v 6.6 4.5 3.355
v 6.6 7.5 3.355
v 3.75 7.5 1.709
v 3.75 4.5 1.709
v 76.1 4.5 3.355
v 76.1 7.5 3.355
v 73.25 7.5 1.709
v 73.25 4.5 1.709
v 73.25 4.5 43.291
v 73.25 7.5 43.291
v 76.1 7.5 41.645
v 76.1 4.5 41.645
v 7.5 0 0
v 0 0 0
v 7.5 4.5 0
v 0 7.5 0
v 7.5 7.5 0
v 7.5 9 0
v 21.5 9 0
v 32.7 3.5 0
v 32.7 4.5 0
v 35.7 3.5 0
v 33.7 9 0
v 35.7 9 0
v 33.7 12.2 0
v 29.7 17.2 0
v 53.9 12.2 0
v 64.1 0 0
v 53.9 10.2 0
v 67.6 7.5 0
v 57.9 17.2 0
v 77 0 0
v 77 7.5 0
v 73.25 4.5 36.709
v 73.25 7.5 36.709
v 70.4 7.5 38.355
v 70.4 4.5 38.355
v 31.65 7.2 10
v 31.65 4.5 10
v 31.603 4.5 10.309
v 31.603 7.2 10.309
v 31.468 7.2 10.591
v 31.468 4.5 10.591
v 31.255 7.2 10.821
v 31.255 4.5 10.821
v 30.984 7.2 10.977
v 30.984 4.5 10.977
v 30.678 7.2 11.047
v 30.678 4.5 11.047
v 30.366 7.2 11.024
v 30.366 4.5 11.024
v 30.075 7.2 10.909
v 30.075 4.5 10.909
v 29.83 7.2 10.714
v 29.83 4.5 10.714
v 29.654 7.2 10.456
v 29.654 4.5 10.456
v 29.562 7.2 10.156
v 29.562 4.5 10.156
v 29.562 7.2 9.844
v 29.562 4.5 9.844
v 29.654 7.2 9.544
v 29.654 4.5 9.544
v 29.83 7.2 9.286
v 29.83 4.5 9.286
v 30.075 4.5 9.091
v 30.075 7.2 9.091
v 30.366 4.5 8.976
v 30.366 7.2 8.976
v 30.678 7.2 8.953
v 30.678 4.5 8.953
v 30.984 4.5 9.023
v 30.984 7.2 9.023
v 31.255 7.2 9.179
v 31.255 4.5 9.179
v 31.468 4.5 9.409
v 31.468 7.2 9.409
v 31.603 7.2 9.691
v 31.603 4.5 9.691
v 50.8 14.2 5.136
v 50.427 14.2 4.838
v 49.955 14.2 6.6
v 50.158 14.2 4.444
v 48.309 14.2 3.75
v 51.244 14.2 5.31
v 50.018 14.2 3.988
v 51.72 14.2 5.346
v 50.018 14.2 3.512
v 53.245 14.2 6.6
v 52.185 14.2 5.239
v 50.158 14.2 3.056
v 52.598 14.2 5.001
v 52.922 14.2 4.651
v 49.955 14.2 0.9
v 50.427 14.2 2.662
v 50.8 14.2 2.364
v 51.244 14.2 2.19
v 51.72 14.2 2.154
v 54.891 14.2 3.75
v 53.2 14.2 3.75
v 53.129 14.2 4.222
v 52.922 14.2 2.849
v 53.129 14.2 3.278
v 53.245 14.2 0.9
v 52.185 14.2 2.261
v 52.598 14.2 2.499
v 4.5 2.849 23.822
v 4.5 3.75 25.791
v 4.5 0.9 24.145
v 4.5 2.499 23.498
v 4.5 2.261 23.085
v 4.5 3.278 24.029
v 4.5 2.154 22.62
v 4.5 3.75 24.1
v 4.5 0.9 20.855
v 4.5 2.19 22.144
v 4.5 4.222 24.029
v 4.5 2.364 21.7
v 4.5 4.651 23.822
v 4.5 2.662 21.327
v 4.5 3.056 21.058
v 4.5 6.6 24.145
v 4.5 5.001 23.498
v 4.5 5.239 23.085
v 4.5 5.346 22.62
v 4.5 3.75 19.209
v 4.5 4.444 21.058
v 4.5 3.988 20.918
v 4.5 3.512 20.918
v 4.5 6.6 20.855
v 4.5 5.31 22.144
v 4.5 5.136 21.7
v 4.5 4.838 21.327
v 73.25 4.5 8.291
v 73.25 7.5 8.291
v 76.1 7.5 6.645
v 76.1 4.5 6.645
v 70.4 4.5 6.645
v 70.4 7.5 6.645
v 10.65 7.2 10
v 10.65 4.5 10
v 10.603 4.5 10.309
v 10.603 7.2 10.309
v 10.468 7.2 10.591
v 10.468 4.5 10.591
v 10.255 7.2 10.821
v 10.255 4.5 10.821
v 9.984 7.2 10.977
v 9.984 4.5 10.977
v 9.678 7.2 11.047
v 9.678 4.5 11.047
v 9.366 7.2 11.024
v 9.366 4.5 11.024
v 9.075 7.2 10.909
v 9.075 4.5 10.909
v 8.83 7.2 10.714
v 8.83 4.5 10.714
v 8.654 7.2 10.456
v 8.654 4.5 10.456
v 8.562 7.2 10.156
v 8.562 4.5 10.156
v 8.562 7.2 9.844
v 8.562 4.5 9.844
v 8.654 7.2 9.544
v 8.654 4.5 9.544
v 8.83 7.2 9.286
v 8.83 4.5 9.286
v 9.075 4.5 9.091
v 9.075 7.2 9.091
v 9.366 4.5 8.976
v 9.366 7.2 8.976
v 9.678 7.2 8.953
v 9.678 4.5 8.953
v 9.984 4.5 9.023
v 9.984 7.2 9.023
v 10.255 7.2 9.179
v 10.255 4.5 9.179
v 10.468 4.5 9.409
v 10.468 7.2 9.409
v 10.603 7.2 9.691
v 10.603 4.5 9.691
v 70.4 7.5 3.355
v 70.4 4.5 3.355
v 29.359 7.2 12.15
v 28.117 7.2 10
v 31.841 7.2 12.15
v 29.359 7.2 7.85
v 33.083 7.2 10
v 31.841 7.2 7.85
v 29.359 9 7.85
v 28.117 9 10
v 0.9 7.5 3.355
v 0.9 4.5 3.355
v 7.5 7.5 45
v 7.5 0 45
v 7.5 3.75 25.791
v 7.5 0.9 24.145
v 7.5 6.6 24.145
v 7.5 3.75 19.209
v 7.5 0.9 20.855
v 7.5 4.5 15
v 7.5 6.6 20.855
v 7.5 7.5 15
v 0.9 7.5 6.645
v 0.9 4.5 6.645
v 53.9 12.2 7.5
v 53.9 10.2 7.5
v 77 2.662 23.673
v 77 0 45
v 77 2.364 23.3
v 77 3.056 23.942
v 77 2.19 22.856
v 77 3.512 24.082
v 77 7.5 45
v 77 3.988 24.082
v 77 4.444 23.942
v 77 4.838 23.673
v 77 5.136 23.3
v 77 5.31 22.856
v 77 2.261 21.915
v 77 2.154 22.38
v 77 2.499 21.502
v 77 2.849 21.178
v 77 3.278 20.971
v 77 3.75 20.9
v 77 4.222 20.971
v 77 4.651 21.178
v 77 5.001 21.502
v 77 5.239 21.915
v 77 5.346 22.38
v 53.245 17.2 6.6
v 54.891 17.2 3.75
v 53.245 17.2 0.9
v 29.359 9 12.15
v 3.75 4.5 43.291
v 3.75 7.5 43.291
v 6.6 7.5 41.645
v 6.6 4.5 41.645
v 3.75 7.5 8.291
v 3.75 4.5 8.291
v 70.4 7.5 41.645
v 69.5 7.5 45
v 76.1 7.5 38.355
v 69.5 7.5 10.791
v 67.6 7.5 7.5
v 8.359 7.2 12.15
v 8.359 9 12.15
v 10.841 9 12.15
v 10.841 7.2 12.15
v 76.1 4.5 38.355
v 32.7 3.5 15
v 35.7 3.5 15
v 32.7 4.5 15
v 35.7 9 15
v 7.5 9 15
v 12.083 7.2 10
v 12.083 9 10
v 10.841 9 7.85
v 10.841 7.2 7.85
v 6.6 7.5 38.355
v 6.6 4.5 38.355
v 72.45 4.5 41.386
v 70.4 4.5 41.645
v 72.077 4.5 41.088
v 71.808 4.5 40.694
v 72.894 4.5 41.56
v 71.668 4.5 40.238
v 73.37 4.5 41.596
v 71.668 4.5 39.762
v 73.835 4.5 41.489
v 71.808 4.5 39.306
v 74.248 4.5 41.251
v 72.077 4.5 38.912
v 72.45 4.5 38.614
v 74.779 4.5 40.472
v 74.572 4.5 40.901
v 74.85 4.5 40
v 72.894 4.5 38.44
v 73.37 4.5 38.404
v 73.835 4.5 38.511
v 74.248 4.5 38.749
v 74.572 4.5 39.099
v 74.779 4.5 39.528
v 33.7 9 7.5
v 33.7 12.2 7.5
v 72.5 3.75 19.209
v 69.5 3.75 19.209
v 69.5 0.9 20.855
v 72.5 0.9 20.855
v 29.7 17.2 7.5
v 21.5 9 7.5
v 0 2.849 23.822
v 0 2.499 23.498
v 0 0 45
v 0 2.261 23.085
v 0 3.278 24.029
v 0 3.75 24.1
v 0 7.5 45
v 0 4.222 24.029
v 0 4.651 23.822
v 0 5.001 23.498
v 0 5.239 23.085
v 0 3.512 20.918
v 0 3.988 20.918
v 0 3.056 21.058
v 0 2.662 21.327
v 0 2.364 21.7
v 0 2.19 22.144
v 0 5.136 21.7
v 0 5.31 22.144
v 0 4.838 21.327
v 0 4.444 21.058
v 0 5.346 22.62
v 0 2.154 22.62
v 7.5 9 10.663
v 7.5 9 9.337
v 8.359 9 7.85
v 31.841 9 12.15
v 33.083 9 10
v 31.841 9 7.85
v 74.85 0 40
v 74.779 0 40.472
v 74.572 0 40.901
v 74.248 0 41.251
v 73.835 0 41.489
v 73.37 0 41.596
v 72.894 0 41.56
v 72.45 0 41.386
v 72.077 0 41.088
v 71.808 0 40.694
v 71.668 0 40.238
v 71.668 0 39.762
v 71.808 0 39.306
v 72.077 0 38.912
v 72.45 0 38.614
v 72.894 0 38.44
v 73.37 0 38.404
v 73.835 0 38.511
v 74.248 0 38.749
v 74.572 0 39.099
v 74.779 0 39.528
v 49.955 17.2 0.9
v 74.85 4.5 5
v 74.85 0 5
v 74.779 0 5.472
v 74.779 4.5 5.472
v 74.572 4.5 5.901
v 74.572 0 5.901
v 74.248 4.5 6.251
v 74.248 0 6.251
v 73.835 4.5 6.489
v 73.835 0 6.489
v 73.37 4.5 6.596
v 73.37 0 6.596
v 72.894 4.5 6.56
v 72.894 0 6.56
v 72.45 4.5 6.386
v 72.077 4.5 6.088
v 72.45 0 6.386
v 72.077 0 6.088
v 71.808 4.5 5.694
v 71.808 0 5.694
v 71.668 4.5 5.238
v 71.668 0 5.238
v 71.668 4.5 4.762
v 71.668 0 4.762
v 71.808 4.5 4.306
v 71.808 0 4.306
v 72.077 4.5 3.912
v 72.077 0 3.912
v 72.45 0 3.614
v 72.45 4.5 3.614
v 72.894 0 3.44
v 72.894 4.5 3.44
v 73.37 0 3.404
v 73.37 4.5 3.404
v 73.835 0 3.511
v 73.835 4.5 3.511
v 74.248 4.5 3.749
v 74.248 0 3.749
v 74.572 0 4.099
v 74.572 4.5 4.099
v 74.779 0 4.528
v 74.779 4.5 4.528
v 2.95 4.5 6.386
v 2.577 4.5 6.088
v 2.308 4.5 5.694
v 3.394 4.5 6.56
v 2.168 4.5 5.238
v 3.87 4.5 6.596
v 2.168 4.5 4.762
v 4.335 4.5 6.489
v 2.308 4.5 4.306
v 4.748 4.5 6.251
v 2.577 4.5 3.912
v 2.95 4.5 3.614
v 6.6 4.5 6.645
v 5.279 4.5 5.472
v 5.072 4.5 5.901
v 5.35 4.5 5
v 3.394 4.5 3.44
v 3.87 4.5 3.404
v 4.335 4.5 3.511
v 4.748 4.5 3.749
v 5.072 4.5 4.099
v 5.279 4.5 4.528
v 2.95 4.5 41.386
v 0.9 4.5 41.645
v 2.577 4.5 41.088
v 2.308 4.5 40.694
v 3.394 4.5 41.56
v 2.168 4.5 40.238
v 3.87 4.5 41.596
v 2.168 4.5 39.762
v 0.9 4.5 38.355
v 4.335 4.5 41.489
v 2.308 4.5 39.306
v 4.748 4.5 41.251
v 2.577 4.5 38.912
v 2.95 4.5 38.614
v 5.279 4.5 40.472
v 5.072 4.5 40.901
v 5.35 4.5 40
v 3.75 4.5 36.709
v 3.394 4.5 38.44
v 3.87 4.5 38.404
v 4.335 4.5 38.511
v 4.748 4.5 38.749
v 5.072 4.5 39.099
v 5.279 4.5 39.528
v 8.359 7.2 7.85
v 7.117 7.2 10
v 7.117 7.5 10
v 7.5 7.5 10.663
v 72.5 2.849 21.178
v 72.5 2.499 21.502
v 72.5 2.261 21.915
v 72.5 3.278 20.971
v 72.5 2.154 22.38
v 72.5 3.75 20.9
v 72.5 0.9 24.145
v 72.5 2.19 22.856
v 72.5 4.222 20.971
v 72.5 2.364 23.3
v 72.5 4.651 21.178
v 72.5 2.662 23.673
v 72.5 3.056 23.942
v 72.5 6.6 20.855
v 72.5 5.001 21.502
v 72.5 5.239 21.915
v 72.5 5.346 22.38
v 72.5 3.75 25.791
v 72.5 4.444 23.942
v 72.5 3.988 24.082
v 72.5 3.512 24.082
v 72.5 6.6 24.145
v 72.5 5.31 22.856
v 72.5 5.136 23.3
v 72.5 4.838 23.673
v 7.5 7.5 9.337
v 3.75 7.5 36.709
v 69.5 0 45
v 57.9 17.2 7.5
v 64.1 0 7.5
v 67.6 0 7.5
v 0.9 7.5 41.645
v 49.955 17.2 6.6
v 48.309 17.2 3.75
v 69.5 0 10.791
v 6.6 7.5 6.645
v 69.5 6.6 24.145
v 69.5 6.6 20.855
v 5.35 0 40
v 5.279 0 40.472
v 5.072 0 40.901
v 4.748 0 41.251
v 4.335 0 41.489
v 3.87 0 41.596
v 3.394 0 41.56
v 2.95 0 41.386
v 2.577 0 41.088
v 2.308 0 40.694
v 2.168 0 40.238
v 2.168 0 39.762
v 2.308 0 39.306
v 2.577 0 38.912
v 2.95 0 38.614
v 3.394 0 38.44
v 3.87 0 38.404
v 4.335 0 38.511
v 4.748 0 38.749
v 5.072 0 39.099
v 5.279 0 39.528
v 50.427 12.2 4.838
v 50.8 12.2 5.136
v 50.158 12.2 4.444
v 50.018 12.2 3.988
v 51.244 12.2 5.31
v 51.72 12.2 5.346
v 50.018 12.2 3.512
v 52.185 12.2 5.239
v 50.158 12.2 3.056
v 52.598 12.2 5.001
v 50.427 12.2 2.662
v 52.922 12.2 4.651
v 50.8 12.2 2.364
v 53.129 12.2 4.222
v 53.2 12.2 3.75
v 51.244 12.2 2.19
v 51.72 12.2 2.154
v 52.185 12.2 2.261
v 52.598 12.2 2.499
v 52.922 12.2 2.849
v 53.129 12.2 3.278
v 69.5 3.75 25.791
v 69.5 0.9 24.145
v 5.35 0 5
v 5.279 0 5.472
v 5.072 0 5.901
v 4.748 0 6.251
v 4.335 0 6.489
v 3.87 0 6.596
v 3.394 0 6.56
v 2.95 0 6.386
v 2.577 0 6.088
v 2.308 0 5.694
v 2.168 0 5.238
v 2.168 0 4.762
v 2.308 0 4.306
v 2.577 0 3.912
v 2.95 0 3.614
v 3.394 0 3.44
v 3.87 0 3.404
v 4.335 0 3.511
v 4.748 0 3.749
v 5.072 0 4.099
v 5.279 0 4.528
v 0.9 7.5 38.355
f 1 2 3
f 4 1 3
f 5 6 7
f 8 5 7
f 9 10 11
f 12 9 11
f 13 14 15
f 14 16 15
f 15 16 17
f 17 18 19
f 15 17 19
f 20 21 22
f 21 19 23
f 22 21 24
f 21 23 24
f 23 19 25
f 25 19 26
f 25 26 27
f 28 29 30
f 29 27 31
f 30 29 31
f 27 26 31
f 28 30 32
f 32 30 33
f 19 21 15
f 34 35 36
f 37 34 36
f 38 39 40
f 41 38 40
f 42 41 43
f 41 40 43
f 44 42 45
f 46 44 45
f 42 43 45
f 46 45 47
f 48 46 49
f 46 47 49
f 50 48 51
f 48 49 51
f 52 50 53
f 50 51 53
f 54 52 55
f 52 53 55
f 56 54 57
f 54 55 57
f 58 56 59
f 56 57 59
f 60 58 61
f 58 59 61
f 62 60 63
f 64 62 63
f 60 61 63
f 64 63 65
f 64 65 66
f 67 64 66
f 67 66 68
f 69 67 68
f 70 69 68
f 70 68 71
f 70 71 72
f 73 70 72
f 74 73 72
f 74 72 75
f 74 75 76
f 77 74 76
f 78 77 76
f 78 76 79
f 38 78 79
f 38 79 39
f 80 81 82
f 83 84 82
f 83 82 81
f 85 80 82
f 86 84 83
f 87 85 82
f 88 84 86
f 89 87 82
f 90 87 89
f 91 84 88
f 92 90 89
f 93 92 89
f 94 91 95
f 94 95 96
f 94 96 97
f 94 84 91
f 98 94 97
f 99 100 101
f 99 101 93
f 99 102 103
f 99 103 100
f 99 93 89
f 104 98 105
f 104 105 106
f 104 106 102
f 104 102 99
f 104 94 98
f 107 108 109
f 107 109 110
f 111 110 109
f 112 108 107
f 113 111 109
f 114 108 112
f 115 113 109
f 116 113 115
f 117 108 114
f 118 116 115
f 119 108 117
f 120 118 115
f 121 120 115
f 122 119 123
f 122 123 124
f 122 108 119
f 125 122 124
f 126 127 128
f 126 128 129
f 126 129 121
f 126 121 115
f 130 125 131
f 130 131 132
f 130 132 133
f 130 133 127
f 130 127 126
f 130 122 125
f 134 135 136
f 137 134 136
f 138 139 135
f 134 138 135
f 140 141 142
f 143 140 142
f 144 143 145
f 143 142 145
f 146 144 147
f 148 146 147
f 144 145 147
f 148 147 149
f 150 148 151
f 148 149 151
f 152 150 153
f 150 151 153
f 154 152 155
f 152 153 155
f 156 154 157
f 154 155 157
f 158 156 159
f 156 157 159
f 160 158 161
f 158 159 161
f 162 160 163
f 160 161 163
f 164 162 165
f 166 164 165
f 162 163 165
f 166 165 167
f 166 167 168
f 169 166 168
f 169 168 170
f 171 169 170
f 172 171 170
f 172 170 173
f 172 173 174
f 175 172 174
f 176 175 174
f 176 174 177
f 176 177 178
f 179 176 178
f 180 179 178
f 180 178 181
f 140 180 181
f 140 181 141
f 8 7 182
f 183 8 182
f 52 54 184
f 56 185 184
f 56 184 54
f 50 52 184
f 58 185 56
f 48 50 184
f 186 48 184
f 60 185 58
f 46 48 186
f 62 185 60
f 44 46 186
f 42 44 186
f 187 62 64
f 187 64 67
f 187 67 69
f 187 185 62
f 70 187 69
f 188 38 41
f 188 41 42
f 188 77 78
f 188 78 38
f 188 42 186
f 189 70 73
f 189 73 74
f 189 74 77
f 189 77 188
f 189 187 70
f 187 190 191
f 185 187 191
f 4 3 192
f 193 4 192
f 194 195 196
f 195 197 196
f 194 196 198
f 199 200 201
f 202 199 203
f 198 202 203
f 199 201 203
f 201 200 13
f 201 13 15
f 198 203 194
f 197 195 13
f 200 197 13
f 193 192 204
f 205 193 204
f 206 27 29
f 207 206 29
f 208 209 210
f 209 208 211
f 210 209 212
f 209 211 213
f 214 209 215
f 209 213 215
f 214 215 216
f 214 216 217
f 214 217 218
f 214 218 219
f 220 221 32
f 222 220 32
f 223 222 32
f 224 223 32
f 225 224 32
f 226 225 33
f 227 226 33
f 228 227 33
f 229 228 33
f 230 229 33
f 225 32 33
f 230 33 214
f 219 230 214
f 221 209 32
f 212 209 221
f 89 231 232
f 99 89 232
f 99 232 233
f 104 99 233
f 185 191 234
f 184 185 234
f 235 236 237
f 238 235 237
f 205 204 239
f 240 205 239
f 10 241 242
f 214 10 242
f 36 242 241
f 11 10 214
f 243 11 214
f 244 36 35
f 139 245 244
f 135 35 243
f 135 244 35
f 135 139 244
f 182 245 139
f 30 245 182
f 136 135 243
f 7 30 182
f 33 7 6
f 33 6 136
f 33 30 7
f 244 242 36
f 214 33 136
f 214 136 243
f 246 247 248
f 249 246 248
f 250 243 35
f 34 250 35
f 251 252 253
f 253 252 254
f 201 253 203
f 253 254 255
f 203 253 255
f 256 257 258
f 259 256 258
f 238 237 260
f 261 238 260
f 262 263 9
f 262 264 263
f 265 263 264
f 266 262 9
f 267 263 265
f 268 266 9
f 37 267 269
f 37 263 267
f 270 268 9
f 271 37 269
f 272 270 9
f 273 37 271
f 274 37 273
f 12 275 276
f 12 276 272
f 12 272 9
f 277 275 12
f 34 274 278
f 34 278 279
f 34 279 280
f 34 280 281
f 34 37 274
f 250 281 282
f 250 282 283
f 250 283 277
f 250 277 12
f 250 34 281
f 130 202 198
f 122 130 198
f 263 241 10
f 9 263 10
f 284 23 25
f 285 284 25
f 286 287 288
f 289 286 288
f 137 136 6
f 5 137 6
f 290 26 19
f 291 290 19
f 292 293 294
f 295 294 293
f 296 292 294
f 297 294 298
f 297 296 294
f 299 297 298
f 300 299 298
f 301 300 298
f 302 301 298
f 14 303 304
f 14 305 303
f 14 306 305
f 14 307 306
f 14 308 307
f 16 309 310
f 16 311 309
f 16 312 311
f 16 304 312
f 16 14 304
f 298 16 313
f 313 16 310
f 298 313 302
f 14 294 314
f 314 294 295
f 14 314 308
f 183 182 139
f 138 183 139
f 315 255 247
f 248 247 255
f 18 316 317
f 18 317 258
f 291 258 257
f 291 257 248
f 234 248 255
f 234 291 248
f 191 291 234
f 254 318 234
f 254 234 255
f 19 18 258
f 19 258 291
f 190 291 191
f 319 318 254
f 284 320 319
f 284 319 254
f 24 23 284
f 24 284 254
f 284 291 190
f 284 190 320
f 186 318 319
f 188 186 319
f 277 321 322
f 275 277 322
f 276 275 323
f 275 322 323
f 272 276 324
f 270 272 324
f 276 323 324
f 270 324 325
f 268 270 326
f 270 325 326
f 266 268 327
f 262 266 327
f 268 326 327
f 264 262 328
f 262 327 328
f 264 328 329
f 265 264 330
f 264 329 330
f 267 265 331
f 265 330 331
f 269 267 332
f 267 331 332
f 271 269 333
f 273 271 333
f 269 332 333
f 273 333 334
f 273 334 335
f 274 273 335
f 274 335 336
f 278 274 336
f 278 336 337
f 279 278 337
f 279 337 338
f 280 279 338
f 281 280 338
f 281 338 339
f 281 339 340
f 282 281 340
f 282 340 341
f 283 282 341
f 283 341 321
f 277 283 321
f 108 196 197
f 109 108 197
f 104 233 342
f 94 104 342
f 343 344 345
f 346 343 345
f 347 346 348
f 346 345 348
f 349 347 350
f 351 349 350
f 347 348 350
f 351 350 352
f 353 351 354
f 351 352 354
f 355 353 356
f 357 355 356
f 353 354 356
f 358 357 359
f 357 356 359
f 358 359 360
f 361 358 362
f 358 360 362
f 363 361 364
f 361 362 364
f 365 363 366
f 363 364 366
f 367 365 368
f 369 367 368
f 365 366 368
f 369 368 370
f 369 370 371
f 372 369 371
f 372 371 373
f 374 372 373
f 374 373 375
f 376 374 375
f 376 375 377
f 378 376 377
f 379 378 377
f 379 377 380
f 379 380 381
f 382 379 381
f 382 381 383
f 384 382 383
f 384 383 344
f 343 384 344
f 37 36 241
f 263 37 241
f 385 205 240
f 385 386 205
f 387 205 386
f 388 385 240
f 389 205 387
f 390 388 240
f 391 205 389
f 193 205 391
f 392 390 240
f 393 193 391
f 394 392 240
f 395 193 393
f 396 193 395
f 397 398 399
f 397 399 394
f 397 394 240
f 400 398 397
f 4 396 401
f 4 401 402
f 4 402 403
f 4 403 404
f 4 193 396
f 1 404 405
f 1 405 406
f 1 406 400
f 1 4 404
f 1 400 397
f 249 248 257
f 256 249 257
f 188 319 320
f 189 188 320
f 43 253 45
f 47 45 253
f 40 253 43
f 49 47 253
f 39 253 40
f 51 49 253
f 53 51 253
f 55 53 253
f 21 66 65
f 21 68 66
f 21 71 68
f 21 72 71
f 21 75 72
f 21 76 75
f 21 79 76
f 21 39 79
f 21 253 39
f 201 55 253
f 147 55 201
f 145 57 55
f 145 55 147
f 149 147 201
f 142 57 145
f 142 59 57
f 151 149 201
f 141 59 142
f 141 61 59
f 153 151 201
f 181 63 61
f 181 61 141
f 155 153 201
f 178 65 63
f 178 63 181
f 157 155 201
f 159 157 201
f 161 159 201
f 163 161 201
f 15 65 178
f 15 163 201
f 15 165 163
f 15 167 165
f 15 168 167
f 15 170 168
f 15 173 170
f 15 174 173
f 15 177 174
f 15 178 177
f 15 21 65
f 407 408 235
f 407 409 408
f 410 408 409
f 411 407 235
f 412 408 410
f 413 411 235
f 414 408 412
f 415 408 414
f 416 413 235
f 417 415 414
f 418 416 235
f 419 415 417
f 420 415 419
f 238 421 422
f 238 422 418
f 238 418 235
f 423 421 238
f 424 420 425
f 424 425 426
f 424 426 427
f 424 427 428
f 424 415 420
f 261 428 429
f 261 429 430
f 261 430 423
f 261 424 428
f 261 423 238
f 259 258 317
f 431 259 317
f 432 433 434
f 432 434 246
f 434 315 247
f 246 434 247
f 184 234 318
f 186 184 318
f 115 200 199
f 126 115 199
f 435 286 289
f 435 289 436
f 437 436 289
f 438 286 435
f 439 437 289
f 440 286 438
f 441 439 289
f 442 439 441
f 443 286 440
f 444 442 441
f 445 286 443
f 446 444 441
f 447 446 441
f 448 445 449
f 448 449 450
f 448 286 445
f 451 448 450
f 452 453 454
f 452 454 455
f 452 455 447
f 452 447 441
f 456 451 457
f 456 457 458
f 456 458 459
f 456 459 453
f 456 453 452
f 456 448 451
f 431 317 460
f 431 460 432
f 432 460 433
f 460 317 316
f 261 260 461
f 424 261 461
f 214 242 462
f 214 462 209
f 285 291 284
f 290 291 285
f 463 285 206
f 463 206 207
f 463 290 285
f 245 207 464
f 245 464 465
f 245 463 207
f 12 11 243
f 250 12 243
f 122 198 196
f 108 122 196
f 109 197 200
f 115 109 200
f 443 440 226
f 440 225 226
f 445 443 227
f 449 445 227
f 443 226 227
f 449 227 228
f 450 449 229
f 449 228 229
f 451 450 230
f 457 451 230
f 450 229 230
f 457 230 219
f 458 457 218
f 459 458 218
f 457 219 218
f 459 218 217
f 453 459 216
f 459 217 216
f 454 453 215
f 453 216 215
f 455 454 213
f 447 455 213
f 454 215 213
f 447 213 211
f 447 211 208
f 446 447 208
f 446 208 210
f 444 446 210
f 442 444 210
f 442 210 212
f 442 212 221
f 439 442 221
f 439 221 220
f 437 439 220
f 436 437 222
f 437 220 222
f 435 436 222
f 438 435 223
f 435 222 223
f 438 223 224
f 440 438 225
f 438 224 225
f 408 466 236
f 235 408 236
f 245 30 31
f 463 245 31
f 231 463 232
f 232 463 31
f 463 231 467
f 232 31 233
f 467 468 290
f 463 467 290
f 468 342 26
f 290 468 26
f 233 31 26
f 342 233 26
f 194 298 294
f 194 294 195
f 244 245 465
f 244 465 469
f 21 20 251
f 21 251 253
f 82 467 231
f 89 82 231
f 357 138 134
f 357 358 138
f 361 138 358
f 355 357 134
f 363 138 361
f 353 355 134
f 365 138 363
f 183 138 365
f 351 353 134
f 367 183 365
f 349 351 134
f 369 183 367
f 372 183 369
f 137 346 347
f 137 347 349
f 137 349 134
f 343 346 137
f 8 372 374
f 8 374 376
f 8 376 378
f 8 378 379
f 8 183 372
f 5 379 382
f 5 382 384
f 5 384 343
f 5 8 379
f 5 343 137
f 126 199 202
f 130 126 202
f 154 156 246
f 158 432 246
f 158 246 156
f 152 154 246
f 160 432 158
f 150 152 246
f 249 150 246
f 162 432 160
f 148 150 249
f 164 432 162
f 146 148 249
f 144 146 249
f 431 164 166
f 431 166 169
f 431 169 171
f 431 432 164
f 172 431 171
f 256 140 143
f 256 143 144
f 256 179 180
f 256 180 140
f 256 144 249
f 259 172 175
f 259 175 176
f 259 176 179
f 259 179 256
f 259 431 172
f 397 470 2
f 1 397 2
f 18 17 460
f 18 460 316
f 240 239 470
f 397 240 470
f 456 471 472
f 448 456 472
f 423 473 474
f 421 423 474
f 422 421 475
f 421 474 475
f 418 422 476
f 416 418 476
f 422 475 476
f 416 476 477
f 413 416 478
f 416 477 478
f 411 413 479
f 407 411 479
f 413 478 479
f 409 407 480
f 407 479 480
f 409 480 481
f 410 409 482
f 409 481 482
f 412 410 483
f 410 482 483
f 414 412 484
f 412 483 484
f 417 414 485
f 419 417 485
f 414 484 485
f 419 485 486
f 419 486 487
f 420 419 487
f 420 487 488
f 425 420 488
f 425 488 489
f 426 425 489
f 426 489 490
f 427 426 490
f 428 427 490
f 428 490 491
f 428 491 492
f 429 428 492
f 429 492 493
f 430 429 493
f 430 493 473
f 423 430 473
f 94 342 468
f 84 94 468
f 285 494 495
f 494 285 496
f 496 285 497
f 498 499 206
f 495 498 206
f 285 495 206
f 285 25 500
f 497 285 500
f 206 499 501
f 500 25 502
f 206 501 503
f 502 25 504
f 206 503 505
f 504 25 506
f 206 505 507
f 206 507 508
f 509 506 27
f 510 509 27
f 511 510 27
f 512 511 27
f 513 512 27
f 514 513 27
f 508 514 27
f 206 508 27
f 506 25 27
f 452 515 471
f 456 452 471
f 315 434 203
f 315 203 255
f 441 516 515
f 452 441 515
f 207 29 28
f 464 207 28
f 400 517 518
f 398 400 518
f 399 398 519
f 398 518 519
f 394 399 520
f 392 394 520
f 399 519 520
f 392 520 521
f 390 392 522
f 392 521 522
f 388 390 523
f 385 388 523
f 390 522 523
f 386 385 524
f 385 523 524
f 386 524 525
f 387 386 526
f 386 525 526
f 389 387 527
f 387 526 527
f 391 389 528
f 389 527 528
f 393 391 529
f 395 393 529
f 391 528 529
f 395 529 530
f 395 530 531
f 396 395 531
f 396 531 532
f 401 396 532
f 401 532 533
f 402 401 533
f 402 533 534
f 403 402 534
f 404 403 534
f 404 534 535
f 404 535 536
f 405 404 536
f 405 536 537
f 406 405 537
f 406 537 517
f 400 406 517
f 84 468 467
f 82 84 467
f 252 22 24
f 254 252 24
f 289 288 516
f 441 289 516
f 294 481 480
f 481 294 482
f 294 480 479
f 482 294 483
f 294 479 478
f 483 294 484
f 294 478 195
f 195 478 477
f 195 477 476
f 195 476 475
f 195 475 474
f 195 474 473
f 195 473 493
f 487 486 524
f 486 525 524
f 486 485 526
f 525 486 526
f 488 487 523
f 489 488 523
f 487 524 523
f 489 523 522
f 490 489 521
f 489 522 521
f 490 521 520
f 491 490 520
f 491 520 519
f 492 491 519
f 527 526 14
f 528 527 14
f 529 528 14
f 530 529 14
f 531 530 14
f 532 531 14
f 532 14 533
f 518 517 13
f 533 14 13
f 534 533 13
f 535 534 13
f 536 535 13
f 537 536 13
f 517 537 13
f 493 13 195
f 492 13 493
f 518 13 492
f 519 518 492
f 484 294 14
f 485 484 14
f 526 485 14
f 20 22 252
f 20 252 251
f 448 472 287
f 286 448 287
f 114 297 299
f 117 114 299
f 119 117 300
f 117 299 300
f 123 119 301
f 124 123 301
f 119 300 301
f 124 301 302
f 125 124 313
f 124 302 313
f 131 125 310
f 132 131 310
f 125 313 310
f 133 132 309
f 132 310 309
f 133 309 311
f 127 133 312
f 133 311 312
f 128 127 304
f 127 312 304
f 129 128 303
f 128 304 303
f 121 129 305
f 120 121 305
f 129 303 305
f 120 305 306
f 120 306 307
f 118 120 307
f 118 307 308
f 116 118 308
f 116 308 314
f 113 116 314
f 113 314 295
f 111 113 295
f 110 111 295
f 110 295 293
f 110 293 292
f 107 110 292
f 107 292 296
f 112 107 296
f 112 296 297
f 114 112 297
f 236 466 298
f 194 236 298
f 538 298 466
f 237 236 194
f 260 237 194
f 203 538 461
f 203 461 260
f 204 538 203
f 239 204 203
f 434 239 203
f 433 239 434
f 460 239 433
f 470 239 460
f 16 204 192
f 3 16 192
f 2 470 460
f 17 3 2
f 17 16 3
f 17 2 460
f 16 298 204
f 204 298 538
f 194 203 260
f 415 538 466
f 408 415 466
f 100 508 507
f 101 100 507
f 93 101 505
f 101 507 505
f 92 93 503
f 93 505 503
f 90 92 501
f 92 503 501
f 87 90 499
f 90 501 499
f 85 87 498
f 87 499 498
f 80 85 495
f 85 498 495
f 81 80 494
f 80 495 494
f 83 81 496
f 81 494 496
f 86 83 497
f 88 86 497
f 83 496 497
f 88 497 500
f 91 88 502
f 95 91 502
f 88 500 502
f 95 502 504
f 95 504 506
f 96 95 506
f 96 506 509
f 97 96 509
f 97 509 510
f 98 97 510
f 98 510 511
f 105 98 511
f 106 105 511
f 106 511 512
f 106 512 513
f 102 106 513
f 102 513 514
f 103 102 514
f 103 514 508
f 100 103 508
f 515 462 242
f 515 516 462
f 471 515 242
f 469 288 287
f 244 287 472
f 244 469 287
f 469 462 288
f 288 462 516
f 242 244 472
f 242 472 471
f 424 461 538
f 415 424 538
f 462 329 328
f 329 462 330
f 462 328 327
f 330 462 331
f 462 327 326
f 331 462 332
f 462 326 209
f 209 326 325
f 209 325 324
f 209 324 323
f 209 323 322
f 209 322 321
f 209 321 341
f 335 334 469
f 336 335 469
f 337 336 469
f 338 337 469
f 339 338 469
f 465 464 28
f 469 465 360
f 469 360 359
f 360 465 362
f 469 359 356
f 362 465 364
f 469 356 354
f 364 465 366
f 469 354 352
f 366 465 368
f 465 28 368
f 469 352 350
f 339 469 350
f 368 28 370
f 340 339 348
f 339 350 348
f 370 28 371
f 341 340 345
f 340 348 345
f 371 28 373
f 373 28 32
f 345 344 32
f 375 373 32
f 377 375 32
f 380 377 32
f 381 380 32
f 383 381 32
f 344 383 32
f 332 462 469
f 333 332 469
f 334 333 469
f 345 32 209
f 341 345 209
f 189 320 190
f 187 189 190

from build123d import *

# Parameters (mm, degrees)
SALIENTE_EXTRUIR1_DEPTH = 7.5
SALIENTE_EXTRUIR2_DEPTH = 7.5
CROQUIS3_W              = 7.5
CROQUIS3_H              = 7.5
SALIENTE_EXTRUIR3_DEPTH = 30
SALIENTE_EXTRUIR4_DEPTH = 7.5
CROQUIS5_W              = 7.5
CROQUIS5_H              = 7.5
SALIENTE_EXTRUIR5_DEPTH = 37.5
CORTAR_EXTRUIR1_REACH   = 19.2
CROQUIS7_R              = 1.6
CORTAR_EXTRUIR2_DEPTH   = 4.5
CORTAR_EXTRUIR3_REACH   = 7
CROQUIS9_R              = 1.6
CORTAR_EXTRUIR4_DEPTH   = 3
CORTAR_EXTRUIR5_REACH   = 14.7
CROQUIS11_R             = 1.05
CORTAR_EXTRUIR6_DEPTH   = 1.8
CORTAR_EXTRUIR7_REACH   = 79
CROQUIS13_R             = 1.6
CORTAR_EXTRUIR8_DEPTH   = 3
CORTAR_EXTRUIR9_REACH   = 79
CROQUIS16_R             = 1.6
CORTAR_EXTRUIR10_DEPTH  = 3


with BuildPart() as part:
    # Croquis1 → Saliente-Extruir1 (new body)
    with BuildSketch(Plane.XY):
        Polygon((0, 0), (7.5, 0), (7.5, 4.5), (32.7, 4.5), (32.7, 3.5), (35.7, 3.5), (35.7, 9), (33.7, 9), (33.7, 12.2), (53.9, 12.2), (53.9, 10.2), (64.1, 0), (77, 0), (77, 7.5), (67.6, 7.5), (57.9, 17.2), (29.7, 17.2), (21.5, 9), (7.5, 9), (7.5, 7.5), (0, 7.5), align=None)
    extrude(amount=SALIENTE_EXTRUIR1_DEPTH)

    # Croquis2 → Saliente-Extruir2 (add)
    with BuildSketch(Plane.XY.offset(7.5)):
        Polygon((0, 7.5), (7.5, 7.5), (7.5, 9), (35.7, 9), (35.7, 7.5), (35.7, 3.5), (32.7, 3.5), (32.7, 4.5), (7.5, 4.5), (7.5, 0), (0, 0), align=None)
    extrude(amount=SALIENTE_EXTRUIR2_DEPTH)

    # Croquis3 → Saliente-Extruir3 (add)
    with BuildSketch(Plane.XY.offset(15)):
        with Locations((3.75, 3.75)):
            Rectangle(CROQUIS3_W, CROQUIS3_H)
    extrude(amount=SALIENTE_EXTRUIR3_DEPTH)

    # Croquis4 → Saliente-Extruir4 (add)
    with BuildSketch(Plane(origin=(0, 7.5, 0), x_dir=(1, 0, 0), z_dir=(0, 1, 0))):
        Polygon((67.6, -7.5), (69.5, -10.790896534), (69.5, -7.5), align=None)
    extrude(amount=-SALIENTE_EXTRUIR4_DEPTH)

    # Croquis5 → Saliente-Extruir5 (add)
    with BuildSketch(Plane.XY.offset(7.5)):
        with Locations((73.25, 3.75)):
            Rectangle(CROQUIS5_W, CROQUIS5_H)
    extrude(amount=SALIENTE_EXTRUIR5_DEPTH)

    # Croquis7 → Cortar-Extruir1 (cut, up to next)
    with BuildSketch(Plane.XZ, mode=Mode.PRIVATE) as cortar_extruir1_sk1:
        with Locations((73.25, 5)):
            Circle(CROQUIS7_R)
    cortar_extruir1_tool1 = extrude(cortar_extruir1_sk1.sketch, amount=-CORTAR_EXTRUIR1_REACH, mode=Mode.PRIVATE) & part.part
    add(cortar_extruir1_tool1.solids().sort_by_distance((73.25, 0, 5))[0], mode=Mode.SUBTRACT)
    # Croquis7 → Cortar-Extruir1 (cut, up to next)
    with BuildSketch(Plane.XZ, mode=Mode.PRIVATE) as cortar_extruir1_sk2:
        with Locations((73.25, 40)):
            Circle(CROQUIS7_R)
    cortar_extruir1_tool2 = extrude(cortar_extruir1_sk2.sketch, amount=-CORTAR_EXTRUIR1_REACH, mode=Mode.PRIVATE) & part.part
    add(cortar_extruir1_tool2.solids().sort_by_distance((73.25, 0, 40))[0], mode=Mode.SUBTRACT)
    # Croquis7 → Cortar-Extruir1 (cut, up to next)
    with BuildSketch(Plane.XZ, mode=Mode.PRIVATE) as cortar_extruir1_sk3:
        with Locations((3.75, 5)):
            Circle(CROQUIS7_R)
    cortar_extruir1_tool3 = extrude(cortar_extruir1_sk3.sketch, amount=-CORTAR_EXTRUIR1_REACH, mode=Mode.PRIVATE) & part.part
    add(cortar_extruir1_tool3.solids().sort_by_distance((3.75, 0, 5))[0], mode=Mode.SUBTRACT)
    # Croquis7 → Cortar-Extruir1 (cut, up to next)
    with BuildSketch(Plane.XZ, mode=Mode.PRIVATE) as cortar_extruir1_sk4:
        with Locations((3.75, 40)):
            Circle(CROQUIS7_R)
    cortar_extruir1_tool4 = extrude(cortar_extruir1_sk4.sketch, amount=-CORTAR_EXTRUIR1_REACH, mode=Mode.PRIVATE) & part.part
    add(cortar_extruir1_tool4.solids().sort_by_distance((3.75, 0, 40))[0], mode=Mode.SUBTRACT)

    # Croquis8 → Cortar-Extruir2 (cut)
    with BuildSketch(Plane(origin=(0, 9, 0), x_dir=(1, 0, 0), z_dir=(0, 1, 0))):
        Polygon((0.9, -3.354551733), (0.9, -6.645448267), (3.75, -8.290896534), (6.6, -6.645448267), (6.6, -3.354551733), (3.75, -1.709103466), align=None)
        Polygon((0.9, -38.354551733), (0.9, -41.645448267), (3.75, -43.290896534), (6.6, -41.645448267), (6.6, -38.354551733), (3.75, -36.709103466), align=None)
        Polygon((70.4, -38.354551733), (70.4, -41.645448267), (73.25, -43.290896534), (76.1, -41.645448267), (76.1, -38.354551733), (73.25, -36.709103466), align=None)
        Polygon((70.4, -3.354551733), (70.4, -6.645448267), (73.25, -8.290896534), (76.1, -6.645448267), (76.1, -3.354551733), (73.25, -1.709103466), align=None)
    extrude(amount=-CORTAR_EXTRUIR2_DEPTH, mode=Mode.SUBTRACT)

    # Croquis9 → Cortar-Extruir3 (cut, up to next)
    with BuildSketch(Plane.XZ.offset(-12.2), mode=Mode.PRIVATE) as cortar_extruir3_sk1:
        with Locations((51.6, 3.75)):
            Circle(CROQUIS9_R)
    cortar_extruir3_tool1 = extrude(cortar_extruir3_sk1.sketch, amount=-CORTAR_EXTRUIR3_REACH, mode=Mode.PRIVATE) & part.part
    add(cortar_extruir3_tool1.solids().sort_by_distance((51.6, 12.2, 3.75))[0], mode=Mode.SUBTRACT)

    # Croquis10 → Cortar-Extruir4 (cut)
    with BuildSketch(Plane(origin=(0, 17.2, 0), x_dir=(1, 0, 0), z_dir=(0, 1, 0))):
        Polygon((49.954551733, -0.9), (48.309103466, -3.75), (49.954551733, -6.6), (53.245448267, -6.6), (54.890896534, -3.75), (53.245448267, -0.9), align=None)
    extrude(amount=-CORTAR_EXTRUIR4_DEPTH, mode=Mode.SUBTRACT)

    # Croquis11 → Cortar-Extruir5 (cut, up to next)
    with BuildSketch(Plane.XZ.offset(-4.5), mode=Mode.PRIVATE) as cortar_extruir5_sk1:
        with Locations((30.6, 10)):
            Circle(CROQUIS11_R)
    cortar_extruir5_tool1 = extrude(cortar_extruir5_sk1.sketch, amount=-CORTAR_EXTRUIR5_REACH, mode=Mode.PRIVATE) & part.part
    add(cortar_extruir5_tool1.solids().sort_by_distance((30.6, 4.5, 10))[0], mode=Mode.SUBTRACT)
    # Croquis11 → Cortar-Extruir5 (cut, up to next)
    with BuildSketch(Plane.XZ.offset(-4.5), mode=Mode.PRIVATE) as cortar_extruir5_sk2:
        with Locations((9.6, 10)):
            Circle(CROQUIS11_R)
    cortar_extruir5_tool2 = extrude(cortar_extruir5_sk2.sketch, amount=-CORTAR_EXTRUIR5_REACH, mode=Mode.PRIVATE) & part.part
    add(cortar_extruir5_tool2.solids().sort_by_distance((9.6, 4.5, 10))[0], mode=Mode.SUBTRACT)

    # Croquis12 → Cortar-Extruir6 (cut)
    with BuildSketch(Plane(origin=(0, 9, 0), x_dir=(1, 0, 0), z_dir=(0, 1, 0))):
        Polygon((8.358696921, -12.15), (10.841303079, -12.15), (12.082606158, -10), (10.841303079, -7.85), (8.358696921, -7.85), (7.117393842, -10), align=None)
        Polygon((28.117393842, -10), (29.358696921, -12.15), (31.841303079, -12.15), (33.082606158, -10), (31.841303079, -7.85), (29.358696921, -7.85), align=None)
    extrude(amount=-CORTAR_EXTRUIR6_DEPTH, mode=Mode.SUBTRACT)

    # Croquis13 → Cortar-Extruir7 (cut, up to next)
    with BuildSketch(Plane.ZY, mode=Mode.PRIVATE) as cortar_extruir7_sk1:
        with Locations((22.5, 3.75)):
            Circle(CROQUIS13_R)
    cortar_extruir7_tool1 = extrude(cortar_extruir7_sk1.sketch, amount=-CORTAR_EXTRUIR7_REACH, mode=Mode.PRIVATE) & part.part
    add(cortar_extruir7_tool1.solids().sort_by_distance((0, 3.75, 22.5))[0], mode=Mode.SUBTRACT)

    # Croquis15 → Cortar-Extruir8 (cut)
    with BuildSketch(Plane(origin=(7.5, 0, 0), x_dir=(0, 0, -1), z_dir=(1, 0, 0))):
        Polygon((-24.145448267, 0.9), (-20.854551733, 0.9), (-19.209103466, 3.75), (-20.854551733, 6.6), (-24.145448267, 6.6), (-25.790896534, 3.75), align=None)
    extrude(amount=-CORTAR_EXTRUIR8_DEPTH, mode=Mode.SUBTRACT)

    # Croquis16 → Cortar-Extruir9 (cut, up to next)
    with BuildSketch(Plane(origin=(77, 0, 0), x_dir=(0, 0, -1), z_dir=(1, 0, 0)), mode=Mode.PRIVATE) as cortar_extruir9_sk1:
        with Locations((-22.5, 3.75)):
            Circle(CROQUIS16_R)
    cortar_extruir9_tool1 = extrude(cortar_extruir9_sk1.sketch, amount=-CORTAR_EXTRUIR9_REACH, mode=Mode.PRIVATE) & part.part
    add(cortar_extruir9_tool1.solids().sort_by_distance((77, 3.75, 22.5))[0], mode=Mode.SUBTRACT)

    # Croquis17 → Cortar-Extruir10 (cut)
    with BuildSketch(Plane.ZY.offset(-69.5)):
        Polygon((20.854551733, 0.9), (24.145448267, 0.9), (25.790896534, 3.75), (24.145448267, 6.6), (20.854551733, 6.6), (19.209103466, 3.75), align=None)
    extrude(amount=-CORTAR_EXTRUIR10_DEPTH, mode=Mode.SUBTRACT)


solid = part.part
